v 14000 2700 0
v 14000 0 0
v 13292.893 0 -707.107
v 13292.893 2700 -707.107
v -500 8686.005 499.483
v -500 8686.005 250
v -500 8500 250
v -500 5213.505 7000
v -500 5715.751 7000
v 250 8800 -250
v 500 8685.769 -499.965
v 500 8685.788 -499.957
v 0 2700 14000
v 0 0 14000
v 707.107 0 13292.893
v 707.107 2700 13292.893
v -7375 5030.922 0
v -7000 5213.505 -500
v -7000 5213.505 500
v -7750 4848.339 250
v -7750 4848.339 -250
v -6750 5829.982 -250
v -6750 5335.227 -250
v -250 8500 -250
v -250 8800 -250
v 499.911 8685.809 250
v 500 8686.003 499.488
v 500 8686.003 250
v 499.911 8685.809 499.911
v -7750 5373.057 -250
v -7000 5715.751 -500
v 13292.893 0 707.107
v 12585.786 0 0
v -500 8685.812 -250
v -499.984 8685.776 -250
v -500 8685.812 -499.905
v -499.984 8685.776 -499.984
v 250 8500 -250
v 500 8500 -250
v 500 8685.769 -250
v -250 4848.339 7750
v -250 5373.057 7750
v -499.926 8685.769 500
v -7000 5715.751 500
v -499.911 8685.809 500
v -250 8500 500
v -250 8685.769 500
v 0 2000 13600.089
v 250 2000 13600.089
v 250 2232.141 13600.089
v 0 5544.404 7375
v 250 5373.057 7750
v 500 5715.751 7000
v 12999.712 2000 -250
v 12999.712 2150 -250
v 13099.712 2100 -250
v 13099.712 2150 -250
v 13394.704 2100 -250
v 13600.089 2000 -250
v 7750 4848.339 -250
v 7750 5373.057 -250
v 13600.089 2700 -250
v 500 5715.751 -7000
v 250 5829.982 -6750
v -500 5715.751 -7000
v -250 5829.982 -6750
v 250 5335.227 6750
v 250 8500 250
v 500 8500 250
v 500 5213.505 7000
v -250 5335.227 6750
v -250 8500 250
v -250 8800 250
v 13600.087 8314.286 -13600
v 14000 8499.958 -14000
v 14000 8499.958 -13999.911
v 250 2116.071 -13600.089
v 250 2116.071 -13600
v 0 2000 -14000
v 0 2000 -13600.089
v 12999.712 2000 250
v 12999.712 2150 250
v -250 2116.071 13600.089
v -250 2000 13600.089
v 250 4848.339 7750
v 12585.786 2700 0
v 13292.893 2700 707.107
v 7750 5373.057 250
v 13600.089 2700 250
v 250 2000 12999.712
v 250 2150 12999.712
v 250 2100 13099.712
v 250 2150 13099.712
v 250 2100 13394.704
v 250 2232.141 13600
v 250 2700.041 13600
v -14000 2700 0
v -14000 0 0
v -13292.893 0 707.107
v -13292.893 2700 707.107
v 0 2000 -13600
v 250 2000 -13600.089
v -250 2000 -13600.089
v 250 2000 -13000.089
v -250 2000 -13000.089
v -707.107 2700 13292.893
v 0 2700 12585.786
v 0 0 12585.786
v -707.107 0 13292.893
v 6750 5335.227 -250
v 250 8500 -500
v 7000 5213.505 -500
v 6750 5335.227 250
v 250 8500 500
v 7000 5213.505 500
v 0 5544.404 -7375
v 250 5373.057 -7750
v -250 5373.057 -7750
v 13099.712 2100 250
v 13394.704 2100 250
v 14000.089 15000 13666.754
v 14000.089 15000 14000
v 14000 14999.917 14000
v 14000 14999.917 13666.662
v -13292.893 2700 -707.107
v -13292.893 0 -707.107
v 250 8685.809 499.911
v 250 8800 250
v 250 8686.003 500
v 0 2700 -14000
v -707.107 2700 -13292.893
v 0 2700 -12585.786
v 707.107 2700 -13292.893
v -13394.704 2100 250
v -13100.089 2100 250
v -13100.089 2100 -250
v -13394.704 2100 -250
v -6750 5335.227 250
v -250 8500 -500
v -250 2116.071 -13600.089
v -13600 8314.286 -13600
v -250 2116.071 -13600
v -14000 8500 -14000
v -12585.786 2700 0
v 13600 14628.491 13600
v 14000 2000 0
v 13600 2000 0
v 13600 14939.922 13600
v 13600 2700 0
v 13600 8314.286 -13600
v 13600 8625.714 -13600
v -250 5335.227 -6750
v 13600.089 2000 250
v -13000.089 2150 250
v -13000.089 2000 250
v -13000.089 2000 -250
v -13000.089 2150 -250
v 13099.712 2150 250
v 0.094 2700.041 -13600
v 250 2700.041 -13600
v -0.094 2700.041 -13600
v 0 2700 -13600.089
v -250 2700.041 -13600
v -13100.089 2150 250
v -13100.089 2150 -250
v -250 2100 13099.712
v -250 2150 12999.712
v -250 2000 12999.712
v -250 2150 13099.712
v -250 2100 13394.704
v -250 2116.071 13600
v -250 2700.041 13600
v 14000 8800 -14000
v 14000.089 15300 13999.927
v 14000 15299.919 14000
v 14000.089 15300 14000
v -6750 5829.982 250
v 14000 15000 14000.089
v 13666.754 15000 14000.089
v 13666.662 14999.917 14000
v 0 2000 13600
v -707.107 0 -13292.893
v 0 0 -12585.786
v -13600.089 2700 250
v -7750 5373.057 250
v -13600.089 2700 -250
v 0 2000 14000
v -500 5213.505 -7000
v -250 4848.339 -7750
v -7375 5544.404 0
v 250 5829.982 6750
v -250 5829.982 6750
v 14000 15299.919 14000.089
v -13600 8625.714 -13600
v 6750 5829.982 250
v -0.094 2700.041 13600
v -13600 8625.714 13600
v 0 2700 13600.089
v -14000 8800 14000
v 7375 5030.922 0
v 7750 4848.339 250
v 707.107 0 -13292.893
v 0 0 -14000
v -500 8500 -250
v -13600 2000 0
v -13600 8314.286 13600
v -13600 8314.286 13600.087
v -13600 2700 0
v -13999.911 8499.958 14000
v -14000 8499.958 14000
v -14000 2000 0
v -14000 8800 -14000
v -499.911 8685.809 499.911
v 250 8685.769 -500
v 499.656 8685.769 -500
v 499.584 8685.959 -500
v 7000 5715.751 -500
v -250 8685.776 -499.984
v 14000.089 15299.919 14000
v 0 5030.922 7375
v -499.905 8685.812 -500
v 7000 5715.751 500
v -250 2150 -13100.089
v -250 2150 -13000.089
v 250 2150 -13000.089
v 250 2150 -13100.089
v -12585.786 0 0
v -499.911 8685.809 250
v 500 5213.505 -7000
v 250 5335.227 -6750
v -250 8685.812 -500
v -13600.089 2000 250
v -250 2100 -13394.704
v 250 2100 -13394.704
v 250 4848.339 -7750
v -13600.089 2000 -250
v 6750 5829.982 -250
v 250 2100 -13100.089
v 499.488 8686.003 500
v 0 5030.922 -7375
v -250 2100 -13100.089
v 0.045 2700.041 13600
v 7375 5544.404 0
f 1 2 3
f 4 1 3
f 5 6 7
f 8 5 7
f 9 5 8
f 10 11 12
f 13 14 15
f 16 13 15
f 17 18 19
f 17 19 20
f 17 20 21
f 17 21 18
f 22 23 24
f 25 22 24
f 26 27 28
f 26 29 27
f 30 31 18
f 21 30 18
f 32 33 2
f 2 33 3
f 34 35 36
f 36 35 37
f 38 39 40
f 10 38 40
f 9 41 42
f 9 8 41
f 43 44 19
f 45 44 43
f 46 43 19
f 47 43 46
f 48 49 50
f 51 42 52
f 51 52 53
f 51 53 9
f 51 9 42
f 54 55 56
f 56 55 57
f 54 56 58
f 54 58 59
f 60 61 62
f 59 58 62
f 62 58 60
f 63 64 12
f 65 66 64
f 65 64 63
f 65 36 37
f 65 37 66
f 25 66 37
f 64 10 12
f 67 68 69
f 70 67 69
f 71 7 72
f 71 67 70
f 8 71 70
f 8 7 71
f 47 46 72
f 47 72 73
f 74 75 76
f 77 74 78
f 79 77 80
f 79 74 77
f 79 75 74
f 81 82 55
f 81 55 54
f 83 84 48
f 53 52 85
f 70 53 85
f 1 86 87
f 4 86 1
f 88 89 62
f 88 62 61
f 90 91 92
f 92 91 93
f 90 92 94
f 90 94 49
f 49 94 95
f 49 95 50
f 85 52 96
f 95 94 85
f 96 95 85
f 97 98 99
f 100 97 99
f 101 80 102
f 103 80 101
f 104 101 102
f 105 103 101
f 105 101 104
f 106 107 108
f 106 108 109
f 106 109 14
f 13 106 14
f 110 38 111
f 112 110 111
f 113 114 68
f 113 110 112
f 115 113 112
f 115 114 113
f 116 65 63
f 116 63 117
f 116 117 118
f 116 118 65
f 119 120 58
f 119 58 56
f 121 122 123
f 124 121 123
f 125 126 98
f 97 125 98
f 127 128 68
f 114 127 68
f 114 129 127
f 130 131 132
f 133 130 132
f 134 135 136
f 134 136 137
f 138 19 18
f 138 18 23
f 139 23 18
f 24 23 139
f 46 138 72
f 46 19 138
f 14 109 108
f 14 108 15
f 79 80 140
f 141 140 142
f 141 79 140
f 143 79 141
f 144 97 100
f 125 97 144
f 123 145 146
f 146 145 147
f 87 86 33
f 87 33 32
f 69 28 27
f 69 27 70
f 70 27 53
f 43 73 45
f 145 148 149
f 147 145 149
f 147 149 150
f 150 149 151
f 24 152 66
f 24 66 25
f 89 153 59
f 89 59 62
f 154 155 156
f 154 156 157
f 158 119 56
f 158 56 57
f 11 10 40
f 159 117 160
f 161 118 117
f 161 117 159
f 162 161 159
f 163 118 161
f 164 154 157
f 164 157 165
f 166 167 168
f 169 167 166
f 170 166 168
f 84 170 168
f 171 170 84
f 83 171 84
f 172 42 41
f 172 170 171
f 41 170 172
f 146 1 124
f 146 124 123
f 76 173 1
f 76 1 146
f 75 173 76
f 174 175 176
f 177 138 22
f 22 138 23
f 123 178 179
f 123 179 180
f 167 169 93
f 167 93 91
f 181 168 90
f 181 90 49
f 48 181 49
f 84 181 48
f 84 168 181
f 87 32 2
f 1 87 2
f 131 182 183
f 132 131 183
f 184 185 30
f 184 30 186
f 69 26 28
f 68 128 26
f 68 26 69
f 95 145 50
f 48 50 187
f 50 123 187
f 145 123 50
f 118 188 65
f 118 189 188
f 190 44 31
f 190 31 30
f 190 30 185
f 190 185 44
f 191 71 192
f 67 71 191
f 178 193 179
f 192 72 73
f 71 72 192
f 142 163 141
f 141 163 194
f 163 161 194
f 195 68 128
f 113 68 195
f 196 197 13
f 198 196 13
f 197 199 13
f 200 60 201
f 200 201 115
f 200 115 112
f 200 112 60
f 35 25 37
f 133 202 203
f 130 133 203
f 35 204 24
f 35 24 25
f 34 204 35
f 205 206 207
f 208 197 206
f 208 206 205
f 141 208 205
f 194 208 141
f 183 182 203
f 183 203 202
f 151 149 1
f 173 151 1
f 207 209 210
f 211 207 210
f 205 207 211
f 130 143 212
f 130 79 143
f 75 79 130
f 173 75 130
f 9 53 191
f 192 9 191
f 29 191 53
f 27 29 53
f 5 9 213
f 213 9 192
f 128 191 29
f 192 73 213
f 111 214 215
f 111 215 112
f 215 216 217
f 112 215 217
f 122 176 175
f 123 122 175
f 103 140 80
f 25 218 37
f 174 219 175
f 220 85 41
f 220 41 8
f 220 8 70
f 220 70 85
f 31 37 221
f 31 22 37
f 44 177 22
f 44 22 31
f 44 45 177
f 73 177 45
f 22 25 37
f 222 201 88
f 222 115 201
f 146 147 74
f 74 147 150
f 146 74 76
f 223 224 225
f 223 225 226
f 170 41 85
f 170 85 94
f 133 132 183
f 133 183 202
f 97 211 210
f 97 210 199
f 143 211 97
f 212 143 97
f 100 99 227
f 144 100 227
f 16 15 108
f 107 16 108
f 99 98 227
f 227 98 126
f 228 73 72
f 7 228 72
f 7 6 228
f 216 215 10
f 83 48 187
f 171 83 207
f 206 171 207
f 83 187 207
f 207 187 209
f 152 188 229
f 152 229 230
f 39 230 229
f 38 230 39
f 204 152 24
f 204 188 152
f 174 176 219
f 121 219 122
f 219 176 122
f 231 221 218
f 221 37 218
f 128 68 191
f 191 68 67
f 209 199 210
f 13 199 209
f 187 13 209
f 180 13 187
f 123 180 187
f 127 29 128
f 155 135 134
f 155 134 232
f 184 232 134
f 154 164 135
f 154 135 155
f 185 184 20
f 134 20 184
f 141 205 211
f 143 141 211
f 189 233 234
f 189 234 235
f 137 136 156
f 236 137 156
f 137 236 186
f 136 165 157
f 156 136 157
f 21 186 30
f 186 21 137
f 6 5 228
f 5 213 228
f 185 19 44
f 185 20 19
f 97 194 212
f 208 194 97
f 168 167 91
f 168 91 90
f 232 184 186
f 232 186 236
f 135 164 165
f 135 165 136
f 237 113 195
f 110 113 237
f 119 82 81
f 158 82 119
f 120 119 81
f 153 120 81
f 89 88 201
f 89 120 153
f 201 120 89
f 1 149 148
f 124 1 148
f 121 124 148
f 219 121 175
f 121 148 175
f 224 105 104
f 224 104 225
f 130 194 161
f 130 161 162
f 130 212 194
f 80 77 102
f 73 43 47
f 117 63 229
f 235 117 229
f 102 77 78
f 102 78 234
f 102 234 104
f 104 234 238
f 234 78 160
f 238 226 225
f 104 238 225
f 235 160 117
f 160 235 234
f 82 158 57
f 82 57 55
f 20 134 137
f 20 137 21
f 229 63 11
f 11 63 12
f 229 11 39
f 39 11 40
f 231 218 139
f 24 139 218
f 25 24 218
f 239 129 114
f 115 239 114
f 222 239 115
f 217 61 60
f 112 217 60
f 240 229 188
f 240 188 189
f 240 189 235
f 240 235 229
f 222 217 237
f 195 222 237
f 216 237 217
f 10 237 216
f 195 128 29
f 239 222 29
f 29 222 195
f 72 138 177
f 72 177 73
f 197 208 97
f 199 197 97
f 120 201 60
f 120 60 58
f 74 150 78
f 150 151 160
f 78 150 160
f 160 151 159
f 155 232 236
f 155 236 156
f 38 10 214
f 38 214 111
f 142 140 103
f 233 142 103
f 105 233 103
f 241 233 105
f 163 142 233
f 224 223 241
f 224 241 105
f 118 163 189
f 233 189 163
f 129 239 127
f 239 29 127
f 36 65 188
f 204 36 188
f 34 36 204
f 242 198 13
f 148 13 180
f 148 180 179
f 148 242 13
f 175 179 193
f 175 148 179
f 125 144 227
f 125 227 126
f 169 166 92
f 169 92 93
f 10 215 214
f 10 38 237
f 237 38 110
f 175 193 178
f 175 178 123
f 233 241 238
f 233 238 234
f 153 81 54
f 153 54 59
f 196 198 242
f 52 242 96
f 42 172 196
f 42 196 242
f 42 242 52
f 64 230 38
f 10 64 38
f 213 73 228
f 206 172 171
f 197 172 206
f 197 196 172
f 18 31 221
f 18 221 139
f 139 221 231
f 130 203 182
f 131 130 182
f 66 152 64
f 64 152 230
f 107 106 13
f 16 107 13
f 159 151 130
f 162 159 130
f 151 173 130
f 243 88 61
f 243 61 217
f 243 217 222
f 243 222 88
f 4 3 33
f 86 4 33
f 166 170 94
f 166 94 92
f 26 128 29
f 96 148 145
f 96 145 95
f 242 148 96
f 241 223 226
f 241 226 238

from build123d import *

# Parameters (mm, degrees)
V_CENTRAL_DEPTH           = 500
V_CENTRAL_2_DEPTH         = 500
SALIENTE_EXTRUIR2_DEPTH   = 1000
SALIENTE_EXTRUIR2_2_DEPTH = 1000
HUECO_W                   = 13500
HUECO_H                   = 500
HUECO_CENITAL_DEPTH       = 9837
MATRIZC12_COUNT           = 2
MATRIZC12_ANGLE           = 90
CORTAR_EXTRUIR3_DEPTH     = 150
CORTAR_EXTRUIR4_DEPTH     = 150
CORTAR_EXTRUIR5_DEPTH     = 150
CORTAR_EXTRUIR6_DEPTH     = 150
VIGA_BORDE_C_1_DEPTH      = 400
MATRIZC15_COUNT           = 2
MATRIZC15_ANGLE           = 90
CORTAR_EXTRUIR7_DEPTH     = 400
CROQUIS14_W               = 659.443586075
CROQUIS14_H               = 500.557822025
CORTAR_EXTRUIR8_DEPTH     = 400
VIGA_BORDE_A_3_DEPTH      = 400
MATRIZC16_COUNT           = 2
MATRIZC16_ANGLE           = 90
CORTAR_EXTRUIR9_DEPTH     = 400
CORTAR_EXTRUIR10_DEPTH    = 400
CORTAR_EXTRUIR11_DEPTH    = 400
CORTAR_EXTRUIR12_DEPTH    = 400
CORTAR_EXTRUIR13_DEPTH    = 400
CORTAR_EXTRUIR14_DEPTH    = 400
SALIENTE_EXTRUIR6_DEPTH   = 2700
SALIENTE_EXTRUIR6_2_DEPTH = 2700
SALIENTE_EXTRUIR6_3_DEPTH = 2700
SALIENTE_EXTRUIR6_4_DEPTH = 2700


with BuildPart() as part:
    # Croquis5 → V Central (new body)
    with BuildSketch(Plane.XY.offset(250)):
        Polygon((-13600.08949546, 2000), (-13000.08949546, 2000), (-13000.08949546, 2150), (-13100.08949546, 2150), (-13100.08949546, 2100), (-13394.703503223, 2100), (-7750, 4848.339086672), (-7750, 5373.056681339), (-13600.08949546, 2700), align=None)
    extrude(amount=-V_CENTRAL_DEPTH)


with BuildPart() as body_2:
    # Croquis5 → V Central 2 (new body)
    with BuildSketch(Plane.XY.offset(250)):
        Polygon((7750, 5373.056681339), (7750, 4848.339086672), (13394.703503223, 2100), (13099.711971619, 2100), (13099.711971619, 2150), (12999.711971619, 2150), (12999.711971619, 2000), (13600.089495461, 2000), (13600.089495461, 2700), align=None)
    extrude(amount=-V_CENTRAL_2_DEPTH)



with BuildPart() as body_3:
    # V Central Cenital → Saliente-Extruir2 (new body)
    with BuildSketch(Plane.XY.offset(500)):
        Polygon((7000, 5213.505178005), (7000, 5715.751013205), (250, 8800), (250, 8500), align=None)
    extrude(amount=-SALIENTE_EXTRUIR2_DEPTH)


with BuildPart() as body_4:
    # V Central Cenital → Saliente-Extruir2 2 (new body)
    with BuildSketch(Plane.XY.offset(500)):
        Polygon((-250, 8500), (-250, 8800), (-7000, 5715.751013205), (-7000, 5213.505178005), align=None)
    extrude(amount=-SALIENTE_EXTRUIR2_2_DEPTH)


    add(part.part)  # recubrir5 joins it to this body
    # loft from a face of the part (recubrir5)
    loft([body_4.faces().sort_by_distance((-7000, 5464.628095605, 0))[0], body_4.faces().sort_by_distance((-7750, 5110.697884006, 0))[0]])


with BuildPart() as body_2_1:
    add(body_2.part)

    add(body_3.part)  # recubrir6 joins it to this body
    # loft from a face of the part (recubrir6)
    loft([body_2_1.faces().sort_by_distance((7750, 5110.697884006, 0))[0], body_2_1.faces().sort_by_distance((7000, 5464.628095605, 0))[0]])


with BuildPart() as hueco_cenital_tool:
    # Hueco → Hueco cenital (new body)
    with BuildSketch(Plane(origin=(0, 0, 0), x_dir=(1, 0, 0), z_dir=(0, 1, 0))):
        Rectangle(HUECO_W, HUECO_H)
    extrude(amount=HUECO_CENITAL_DEPTH)


with BuildPart() as body_2_2:
    add(body_2_1.part)

    # Hueco cenital: cut by hueco_cenital_tool
    add(hueco_cenital_tool.part, mode=Mode.SUBTRACT)


with BuildPart() as body_4_1:
    add(body_4.part)

    # Hueco cenital: cut by hueco_cenital_tool
    add(hueco_cenital_tool.part, mode=Mode.SUBTRACT)


with BuildPart() as matrizc12_1:
    # MatrizC12: pattern copy
    add(body_2_2.part.rotate(Axis((0, 0, 0), (0, -1, 0)), 1 * MATRIZC12_ANGLE / (MATRIZC12_COUNT - 1)))


with BuildPart() as matrizc12_2:
    # MatrizC12: pattern copy
    add(body_4_1.part.rotate(Axis((0, 0, 0), (0, -1, 0)), 1 * MATRIZC12_ANGLE / (MATRIZC12_COUNT - 1)))


with BuildPart() as cortar_extruir3_tool:
    # Croquis8 → Cortar-Extruir3 (new body)
    with BuildSketch(Plane(origin=(3369.627388011, 7374.561835459, 0), x_dir=(0.9095491198215689, -0.4155964372222283, 0), z_dir=(0.4155964372222283, 0.9095491198215689, 0))):
        Polygon((-3429.8613676, -250), (-3155.097216856, -500), (-3155.097216856, -250), align=None)
        Polygon((-3429.8613676, 250), (-3154.961038643, 250), (-3154.961038643, 500), align=None)
    extrude(amount=CORTAR_EXTRUIR3_DEPTH)


with BuildPart() as matrizc12_1_1:
    add(matrizc12_1.part)

    # Cortar-Extruir3: cut by cortar_extruir3_tool
    add(cortar_extruir3_tool.part, mode=Mode.SUBTRACT)


with BuildPart() as matrizc12_2_1:
    add(matrizc12_2.part)

    # Cortar-Extruir3: cut by cortar_extruir3_tool
    add(cortar_extruir3_tool.part, mode=Mode.SUBTRACT)


with BuildPart() as cortar_extruir4_tool:
    # Croquis9 → Cortar-Extruir4 (new body)
    with BuildSketch(Plane(origin=(0, 7374.561835459, 3369.627388011), x_dir=(1, 0, 0), z_dir=(-1.4510472050511015e-15, 0.9095491198215689, 0.4155964372222283))):
        Polygon((250, 3429.8613676), (499.911491468, 3155.097216856), (250, 3155.097216856), align=None)
        Polygon((-250, 3429.8613676), (-500, 3154.918676232), (-250, 3154.918676232), align=None)
    extrude(amount=CORTAR_EXTRUIR4_DEPTH)


with BuildPart() as body_2_3:
    add(body_2_2.part)

    # Cortar-Extruir4: cut by cortar_extruir4_tool
    add(cortar_extruir4_tool.part, mode=Mode.SUBTRACT)


with BuildPart() as body_4_2:
    add(body_4_1.part)

    # Cortar-Extruir4: cut by cortar_extruir4_tool
    add(cortar_extruir4_tool.part, mode=Mode.SUBTRACT)


with BuildPart() as cortar_extruir5_tool:
    # Croquis10 → Cortar-Extruir5 (new body)
    with BuildSketch(Plane(origin=(-3369.627388011, 7374.561835459, 0), x_dir=(0.9095491198215687, 0.4155964372222282, 0), z_dir=(-0.4155964372222283, 0.9095491198215688, 0))):
        Polygon((3429.861367601, 250), (3155.017939079, 250), (3155.017939079, 500), align=None)
        Polygon((3155.098061094, -250), (3429.861367601, -250), (3155.098061094, -500), align=None)
    extrude(amount=CORTAR_EXTRUIR5_DEPTH)


with BuildPart() as matrizc12_1_2:
    add(matrizc12_1_1.part)

    # Cortar-Extruir5: cut by cortar_extruir5_tool
    add(cortar_extruir5_tool.part, mode=Mode.SUBTRACT)

    # Croquis12 → VIGA BORDE C-1 (add)
    with BuildSketch(Plane.XY.offset(14000)):
        Polygon((-14000, 8800), (0, 2700), (14000.089495461, 15300), (14000.089495461, 15000), (0, 2000), (-14000, 8500), align=None)
    viga_borde_c_1 = extrude(amount=-VIGA_BORDE_C_1_DEPTH)

    # MatrizC15: VIGA BORDE C-1 ×2 about axis
    matrizc15_axis = Axis((13800, 0, 13800), (0, -1, 0))
    for i in range(1, MATRIZC15_COUNT):
        add(viga_borde_c_1.rotate(matrizc15_axis, i * MATRIZC15_ANGLE / (MATRIZC15_COUNT - 1)))

    # Croquis13 → Cortar-Extruir7 (cut)
    with BuildSketch(Plane(origin=(0, 1491.721241974, -1342.540535542), x_dir=(1, 0, 0), z_dir=(2.283669573086975e-15, 0.7432962726122418, -0.6689623689870365))):
        Polygon((14046.458462562, -20641.204195829), (13600, -20641.338583716), (13600, -20103.074757832), (14046.458462562, -20103.074757832), align=None)
    extrude(amount=CORTAR_EXTRUIR7_DEPTH, mode=Mode.SUBTRACT)

    # Croquis14 → Cortar-Extruir8 (cut)
    with BuildSketch(Plane(origin=(-1342.540535542, 1491.721241974, 0), x_dir=(0.7432962726122418, 0.6689623689870365, 0), z_dir=(-0.6689623689870365, 0.7432962726122418, 0))):
        with Locations((20432.79655087, -13850.278911013)):
            Rectangle(CROQUIS14_W, CROQUIS14_H)
    extrude(amount=CORTAR_EXTRUIR8_DEPTH, mode=Mode.SUBTRACT)



with BuildPart() as matrizc12_2_2:
    add(matrizc12_2_1.part)

    # Cortar-Extruir5: cut by cortar_extruir5_tool
    add(cortar_extruir5_tool.part, mode=Mode.SUBTRACT)


with BuildPart() as cortar_extruir6_tool:
    # Croquis11 → Cortar-Extruir6 (new body)
    with BuildSketch(Plane(origin=(0, 7374.561835459, -3369.627388011), x_dir=(1, 0, 0), z_dir=(1.4510472050511017e-15, 0.9095491198215687, -0.4155964372222282))):
        Polygon((250, -3429.861367601), (250, -3154.620815718), (500, -3154.620815718), align=None)
        Polygon((-250, -3429.861367601), (-499.983598501, -3155.017939078), (-250, -3155.017939078), align=None)
    extrude(amount=CORTAR_EXTRUIR6_DEPTH)


with BuildPart() as body_2_4:
    add(body_2_3.part)

    # Cortar-Extruir6: cut by cortar_extruir6_tool
    add(cortar_extruir6_tool.part, mode=Mode.SUBTRACT)


with BuildPart() as body_4_3:
    add(body_4_2.part)

    # Cortar-Extruir6: cut by cortar_extruir6_tool
    add(cortar_extruir6_tool.part, mode=Mode.SUBTRACT)


with BuildPart() as matrizc12_1_3:
    add(matrizc12_1_2.part)

    add(matrizc12_2_2.part)  # VIGA BORDE A-3 merges MatrizC12_2
    # Croquis15 → VIGA BORDE A-3 (add)
    with BuildSketch(Plane.XY.offset(-14000)):
        Polygon((-14000, 8800), (0, 2700), (14000, 8800), (14000, 8499.958448801), (0, 2000), (-14000, 8500), align=None)
    viga_borde_a_3 = extrude(amount=VIGA_BORDE_A_3_DEPTH)

    # MatrizC16: VIGA BORDE A-3 ×2 about axis
    matrizc16_axis = Axis((-13800, 0, -13800), (0, -1, 0))
    for i in range(1, MATRIZC16_COUNT):
        add(viga_borde_a_3.rotate(matrizc16_axis, i * MATRIZC16_ANGLE / (MATRIZC16_COUNT - 1)))

    # Croquis16 → Cortar-Extruir9 (cut)
    with BuildSketch(Plane(origin=(-988.722610523, 2269.199433987, 0), x_dir=(0.916757456915312, 0.3994443205130973, 0), z_dir=(-0.3994443205130973, 0.916757456915312, 0))):
        Polygon((16349.71441733, 14000), (15913.393995846, 13600), (15913.393995846, 14000), align=None)
    extrude(amount=CORTAR_EXTRUIR9_DEPTH, mode=Mode.SUBTRACT)

    # Croquis17 → Cortar-Extruir10 (cut)
    with BuildSketch(Plane(origin=(0, 2269.199433987, 988.722610523), x_dir=(1, 0, 0), z_dir=(-1.4587875677430013e-15, 0.9167574569153109, 0.39944432051309986))):
        Polygon((14000, 15913.393995846), (14000, 16349.71441733), (13600, 15913.393995846), align=None)
    extrude(amount=CORTAR_EXTRUIR10_DEPTH, mode=Mode.SUBTRACT)

    # Croquis18 → Cortar-Extruir11 (cut)
    with BuildSketch(Plane(origin=(0, 2269.199433987, 988.722610523), x_dir=(1, 0, 0), z_dir=(-1.6017007930813528e-15, 0.916757456915311, 0.3994443205130998))):
        Polygon((-14000, 16349.714417329), (-14000, 15913.393995846), (-13600, 15913.393995845), align=None)
    extrude(amount=CORTAR_EXTRUIR11_DEPTH, mode=Mode.SUBTRACT)

    # Croquis19 → Cortar-Extruir12 (cut)
    with BuildSketch(Plane(origin=(988.722610523, 2269.199433987, 0), x_dir=(0.916757456915311, -0.3994443205130998, 0), z_dir=(0.3994443205130998, 0.916757456915311, 0))):
        Polygon((-15913.393995845, 14000), (-16349.714417329, 14000), (-15913.393995845, 13600), align=None)
    extrude(amount=CORTAR_EXTRUIR12_DEPTH, mode=Mode.SUBTRACT)

    # Croquis20 → Cortar-Extruir13 (cut)
    with BuildSketch(Plane(origin=(988.722610523, 2269.199433987, 0), x_dir=(0.916757456915311, -0.3994443205130998, 0), z_dir=(0.3994443205130998, 0.916757456915311, 0))):
        Polygon((-16349.71441733, -14000), (-15913.393995845, -13600), (-15913.393995845, -14000), align=None)
    extrude(amount=CORTAR_EXTRUIR13_DEPTH, mode=Mode.SUBTRACT)

    # Croquis21 → Cortar-Extruir14 (cut)
    with BuildSketch(Plane(origin=(0, 2269.199433986, -988.722610523), x_dir=(1, 0, 0), z_dir=(1.1876039888753645e-15, 0.916757456915312, -0.3994443205130973))):
        Polygon((-14000, -15830.076145405), (-14000, -16349.71441733), (-13600, -15913.393995845), (-13600, -15830.076145405), align=None)
    extrude(amount=CORTAR_EXTRUIR14_DEPTH, mode=Mode.SUBTRACT)


with BuildPart() as body_4_2_1:
    # Planta → Saliente-Extruir6 (new body)
    with BuildSketch(Plane(origin=(0, 0, 0), x_dir=(1, 0, 0), z_dir=(0, 1, 0))):
        Polygon((0, 12585.786437627), (707.106781187, 13292.893218813), (0, 14000), (-707.106781187, 13292.893218813), align=None)
    extrude(amount=SALIENTE_EXTRUIR6_DEPTH)


with BuildPart() as body_5:
    # Planta → Saliente-Extruir6 2 (new body)
    with BuildSketch(Plane(origin=(0, 0, 0), x_dir=(1, 0, 0), z_dir=(0, 1, 0))):
        Polygon((14000, 0), (13292.893218813, 707.106781187), (12585.786437627, 0), (13292.893218813, -707.106781187), align=None)
    extrude(amount=SALIENTE_EXTRUIR6_2_DEPTH)


with BuildPart() as body_6:
    # Planta → Saliente-Extruir6 3 (new body)
    with BuildSketch(Plane(origin=(0, 0, 0), x_dir=(1, 0, 0), z_dir=(0, 1, 0))):
        Polygon((-707.106781187, -13292.893218813), (0, -14000), (707.106781187, -13292.893218813), (0, -12585.786437627), align=None)
    extrude(amount=SALIENTE_EXTRUIR6_3_DEPTH)


with BuildPart() as body_7:
    # Planta → Saliente-Extruir6 4 (new body)
    with BuildSketch(Plane(origin=(0, 0, 0), x_dir=(1, 0, 0), z_dir=(0, 1, 0))):
        Polygon((-13292.893218813, 707.106781187), (-14000, 0), (-13292.893218813, -707.106781187), (-12585.786437627, 0), align=None)
    extrude(amount=SALIENTE_EXTRUIR6_4_DEPTH)


solid = Compound([body_2_4.part, body_4_3.part, matrizc12_1_3.part, body_4_2_1.part, body_5.part, body_6.part, body_7.part])
